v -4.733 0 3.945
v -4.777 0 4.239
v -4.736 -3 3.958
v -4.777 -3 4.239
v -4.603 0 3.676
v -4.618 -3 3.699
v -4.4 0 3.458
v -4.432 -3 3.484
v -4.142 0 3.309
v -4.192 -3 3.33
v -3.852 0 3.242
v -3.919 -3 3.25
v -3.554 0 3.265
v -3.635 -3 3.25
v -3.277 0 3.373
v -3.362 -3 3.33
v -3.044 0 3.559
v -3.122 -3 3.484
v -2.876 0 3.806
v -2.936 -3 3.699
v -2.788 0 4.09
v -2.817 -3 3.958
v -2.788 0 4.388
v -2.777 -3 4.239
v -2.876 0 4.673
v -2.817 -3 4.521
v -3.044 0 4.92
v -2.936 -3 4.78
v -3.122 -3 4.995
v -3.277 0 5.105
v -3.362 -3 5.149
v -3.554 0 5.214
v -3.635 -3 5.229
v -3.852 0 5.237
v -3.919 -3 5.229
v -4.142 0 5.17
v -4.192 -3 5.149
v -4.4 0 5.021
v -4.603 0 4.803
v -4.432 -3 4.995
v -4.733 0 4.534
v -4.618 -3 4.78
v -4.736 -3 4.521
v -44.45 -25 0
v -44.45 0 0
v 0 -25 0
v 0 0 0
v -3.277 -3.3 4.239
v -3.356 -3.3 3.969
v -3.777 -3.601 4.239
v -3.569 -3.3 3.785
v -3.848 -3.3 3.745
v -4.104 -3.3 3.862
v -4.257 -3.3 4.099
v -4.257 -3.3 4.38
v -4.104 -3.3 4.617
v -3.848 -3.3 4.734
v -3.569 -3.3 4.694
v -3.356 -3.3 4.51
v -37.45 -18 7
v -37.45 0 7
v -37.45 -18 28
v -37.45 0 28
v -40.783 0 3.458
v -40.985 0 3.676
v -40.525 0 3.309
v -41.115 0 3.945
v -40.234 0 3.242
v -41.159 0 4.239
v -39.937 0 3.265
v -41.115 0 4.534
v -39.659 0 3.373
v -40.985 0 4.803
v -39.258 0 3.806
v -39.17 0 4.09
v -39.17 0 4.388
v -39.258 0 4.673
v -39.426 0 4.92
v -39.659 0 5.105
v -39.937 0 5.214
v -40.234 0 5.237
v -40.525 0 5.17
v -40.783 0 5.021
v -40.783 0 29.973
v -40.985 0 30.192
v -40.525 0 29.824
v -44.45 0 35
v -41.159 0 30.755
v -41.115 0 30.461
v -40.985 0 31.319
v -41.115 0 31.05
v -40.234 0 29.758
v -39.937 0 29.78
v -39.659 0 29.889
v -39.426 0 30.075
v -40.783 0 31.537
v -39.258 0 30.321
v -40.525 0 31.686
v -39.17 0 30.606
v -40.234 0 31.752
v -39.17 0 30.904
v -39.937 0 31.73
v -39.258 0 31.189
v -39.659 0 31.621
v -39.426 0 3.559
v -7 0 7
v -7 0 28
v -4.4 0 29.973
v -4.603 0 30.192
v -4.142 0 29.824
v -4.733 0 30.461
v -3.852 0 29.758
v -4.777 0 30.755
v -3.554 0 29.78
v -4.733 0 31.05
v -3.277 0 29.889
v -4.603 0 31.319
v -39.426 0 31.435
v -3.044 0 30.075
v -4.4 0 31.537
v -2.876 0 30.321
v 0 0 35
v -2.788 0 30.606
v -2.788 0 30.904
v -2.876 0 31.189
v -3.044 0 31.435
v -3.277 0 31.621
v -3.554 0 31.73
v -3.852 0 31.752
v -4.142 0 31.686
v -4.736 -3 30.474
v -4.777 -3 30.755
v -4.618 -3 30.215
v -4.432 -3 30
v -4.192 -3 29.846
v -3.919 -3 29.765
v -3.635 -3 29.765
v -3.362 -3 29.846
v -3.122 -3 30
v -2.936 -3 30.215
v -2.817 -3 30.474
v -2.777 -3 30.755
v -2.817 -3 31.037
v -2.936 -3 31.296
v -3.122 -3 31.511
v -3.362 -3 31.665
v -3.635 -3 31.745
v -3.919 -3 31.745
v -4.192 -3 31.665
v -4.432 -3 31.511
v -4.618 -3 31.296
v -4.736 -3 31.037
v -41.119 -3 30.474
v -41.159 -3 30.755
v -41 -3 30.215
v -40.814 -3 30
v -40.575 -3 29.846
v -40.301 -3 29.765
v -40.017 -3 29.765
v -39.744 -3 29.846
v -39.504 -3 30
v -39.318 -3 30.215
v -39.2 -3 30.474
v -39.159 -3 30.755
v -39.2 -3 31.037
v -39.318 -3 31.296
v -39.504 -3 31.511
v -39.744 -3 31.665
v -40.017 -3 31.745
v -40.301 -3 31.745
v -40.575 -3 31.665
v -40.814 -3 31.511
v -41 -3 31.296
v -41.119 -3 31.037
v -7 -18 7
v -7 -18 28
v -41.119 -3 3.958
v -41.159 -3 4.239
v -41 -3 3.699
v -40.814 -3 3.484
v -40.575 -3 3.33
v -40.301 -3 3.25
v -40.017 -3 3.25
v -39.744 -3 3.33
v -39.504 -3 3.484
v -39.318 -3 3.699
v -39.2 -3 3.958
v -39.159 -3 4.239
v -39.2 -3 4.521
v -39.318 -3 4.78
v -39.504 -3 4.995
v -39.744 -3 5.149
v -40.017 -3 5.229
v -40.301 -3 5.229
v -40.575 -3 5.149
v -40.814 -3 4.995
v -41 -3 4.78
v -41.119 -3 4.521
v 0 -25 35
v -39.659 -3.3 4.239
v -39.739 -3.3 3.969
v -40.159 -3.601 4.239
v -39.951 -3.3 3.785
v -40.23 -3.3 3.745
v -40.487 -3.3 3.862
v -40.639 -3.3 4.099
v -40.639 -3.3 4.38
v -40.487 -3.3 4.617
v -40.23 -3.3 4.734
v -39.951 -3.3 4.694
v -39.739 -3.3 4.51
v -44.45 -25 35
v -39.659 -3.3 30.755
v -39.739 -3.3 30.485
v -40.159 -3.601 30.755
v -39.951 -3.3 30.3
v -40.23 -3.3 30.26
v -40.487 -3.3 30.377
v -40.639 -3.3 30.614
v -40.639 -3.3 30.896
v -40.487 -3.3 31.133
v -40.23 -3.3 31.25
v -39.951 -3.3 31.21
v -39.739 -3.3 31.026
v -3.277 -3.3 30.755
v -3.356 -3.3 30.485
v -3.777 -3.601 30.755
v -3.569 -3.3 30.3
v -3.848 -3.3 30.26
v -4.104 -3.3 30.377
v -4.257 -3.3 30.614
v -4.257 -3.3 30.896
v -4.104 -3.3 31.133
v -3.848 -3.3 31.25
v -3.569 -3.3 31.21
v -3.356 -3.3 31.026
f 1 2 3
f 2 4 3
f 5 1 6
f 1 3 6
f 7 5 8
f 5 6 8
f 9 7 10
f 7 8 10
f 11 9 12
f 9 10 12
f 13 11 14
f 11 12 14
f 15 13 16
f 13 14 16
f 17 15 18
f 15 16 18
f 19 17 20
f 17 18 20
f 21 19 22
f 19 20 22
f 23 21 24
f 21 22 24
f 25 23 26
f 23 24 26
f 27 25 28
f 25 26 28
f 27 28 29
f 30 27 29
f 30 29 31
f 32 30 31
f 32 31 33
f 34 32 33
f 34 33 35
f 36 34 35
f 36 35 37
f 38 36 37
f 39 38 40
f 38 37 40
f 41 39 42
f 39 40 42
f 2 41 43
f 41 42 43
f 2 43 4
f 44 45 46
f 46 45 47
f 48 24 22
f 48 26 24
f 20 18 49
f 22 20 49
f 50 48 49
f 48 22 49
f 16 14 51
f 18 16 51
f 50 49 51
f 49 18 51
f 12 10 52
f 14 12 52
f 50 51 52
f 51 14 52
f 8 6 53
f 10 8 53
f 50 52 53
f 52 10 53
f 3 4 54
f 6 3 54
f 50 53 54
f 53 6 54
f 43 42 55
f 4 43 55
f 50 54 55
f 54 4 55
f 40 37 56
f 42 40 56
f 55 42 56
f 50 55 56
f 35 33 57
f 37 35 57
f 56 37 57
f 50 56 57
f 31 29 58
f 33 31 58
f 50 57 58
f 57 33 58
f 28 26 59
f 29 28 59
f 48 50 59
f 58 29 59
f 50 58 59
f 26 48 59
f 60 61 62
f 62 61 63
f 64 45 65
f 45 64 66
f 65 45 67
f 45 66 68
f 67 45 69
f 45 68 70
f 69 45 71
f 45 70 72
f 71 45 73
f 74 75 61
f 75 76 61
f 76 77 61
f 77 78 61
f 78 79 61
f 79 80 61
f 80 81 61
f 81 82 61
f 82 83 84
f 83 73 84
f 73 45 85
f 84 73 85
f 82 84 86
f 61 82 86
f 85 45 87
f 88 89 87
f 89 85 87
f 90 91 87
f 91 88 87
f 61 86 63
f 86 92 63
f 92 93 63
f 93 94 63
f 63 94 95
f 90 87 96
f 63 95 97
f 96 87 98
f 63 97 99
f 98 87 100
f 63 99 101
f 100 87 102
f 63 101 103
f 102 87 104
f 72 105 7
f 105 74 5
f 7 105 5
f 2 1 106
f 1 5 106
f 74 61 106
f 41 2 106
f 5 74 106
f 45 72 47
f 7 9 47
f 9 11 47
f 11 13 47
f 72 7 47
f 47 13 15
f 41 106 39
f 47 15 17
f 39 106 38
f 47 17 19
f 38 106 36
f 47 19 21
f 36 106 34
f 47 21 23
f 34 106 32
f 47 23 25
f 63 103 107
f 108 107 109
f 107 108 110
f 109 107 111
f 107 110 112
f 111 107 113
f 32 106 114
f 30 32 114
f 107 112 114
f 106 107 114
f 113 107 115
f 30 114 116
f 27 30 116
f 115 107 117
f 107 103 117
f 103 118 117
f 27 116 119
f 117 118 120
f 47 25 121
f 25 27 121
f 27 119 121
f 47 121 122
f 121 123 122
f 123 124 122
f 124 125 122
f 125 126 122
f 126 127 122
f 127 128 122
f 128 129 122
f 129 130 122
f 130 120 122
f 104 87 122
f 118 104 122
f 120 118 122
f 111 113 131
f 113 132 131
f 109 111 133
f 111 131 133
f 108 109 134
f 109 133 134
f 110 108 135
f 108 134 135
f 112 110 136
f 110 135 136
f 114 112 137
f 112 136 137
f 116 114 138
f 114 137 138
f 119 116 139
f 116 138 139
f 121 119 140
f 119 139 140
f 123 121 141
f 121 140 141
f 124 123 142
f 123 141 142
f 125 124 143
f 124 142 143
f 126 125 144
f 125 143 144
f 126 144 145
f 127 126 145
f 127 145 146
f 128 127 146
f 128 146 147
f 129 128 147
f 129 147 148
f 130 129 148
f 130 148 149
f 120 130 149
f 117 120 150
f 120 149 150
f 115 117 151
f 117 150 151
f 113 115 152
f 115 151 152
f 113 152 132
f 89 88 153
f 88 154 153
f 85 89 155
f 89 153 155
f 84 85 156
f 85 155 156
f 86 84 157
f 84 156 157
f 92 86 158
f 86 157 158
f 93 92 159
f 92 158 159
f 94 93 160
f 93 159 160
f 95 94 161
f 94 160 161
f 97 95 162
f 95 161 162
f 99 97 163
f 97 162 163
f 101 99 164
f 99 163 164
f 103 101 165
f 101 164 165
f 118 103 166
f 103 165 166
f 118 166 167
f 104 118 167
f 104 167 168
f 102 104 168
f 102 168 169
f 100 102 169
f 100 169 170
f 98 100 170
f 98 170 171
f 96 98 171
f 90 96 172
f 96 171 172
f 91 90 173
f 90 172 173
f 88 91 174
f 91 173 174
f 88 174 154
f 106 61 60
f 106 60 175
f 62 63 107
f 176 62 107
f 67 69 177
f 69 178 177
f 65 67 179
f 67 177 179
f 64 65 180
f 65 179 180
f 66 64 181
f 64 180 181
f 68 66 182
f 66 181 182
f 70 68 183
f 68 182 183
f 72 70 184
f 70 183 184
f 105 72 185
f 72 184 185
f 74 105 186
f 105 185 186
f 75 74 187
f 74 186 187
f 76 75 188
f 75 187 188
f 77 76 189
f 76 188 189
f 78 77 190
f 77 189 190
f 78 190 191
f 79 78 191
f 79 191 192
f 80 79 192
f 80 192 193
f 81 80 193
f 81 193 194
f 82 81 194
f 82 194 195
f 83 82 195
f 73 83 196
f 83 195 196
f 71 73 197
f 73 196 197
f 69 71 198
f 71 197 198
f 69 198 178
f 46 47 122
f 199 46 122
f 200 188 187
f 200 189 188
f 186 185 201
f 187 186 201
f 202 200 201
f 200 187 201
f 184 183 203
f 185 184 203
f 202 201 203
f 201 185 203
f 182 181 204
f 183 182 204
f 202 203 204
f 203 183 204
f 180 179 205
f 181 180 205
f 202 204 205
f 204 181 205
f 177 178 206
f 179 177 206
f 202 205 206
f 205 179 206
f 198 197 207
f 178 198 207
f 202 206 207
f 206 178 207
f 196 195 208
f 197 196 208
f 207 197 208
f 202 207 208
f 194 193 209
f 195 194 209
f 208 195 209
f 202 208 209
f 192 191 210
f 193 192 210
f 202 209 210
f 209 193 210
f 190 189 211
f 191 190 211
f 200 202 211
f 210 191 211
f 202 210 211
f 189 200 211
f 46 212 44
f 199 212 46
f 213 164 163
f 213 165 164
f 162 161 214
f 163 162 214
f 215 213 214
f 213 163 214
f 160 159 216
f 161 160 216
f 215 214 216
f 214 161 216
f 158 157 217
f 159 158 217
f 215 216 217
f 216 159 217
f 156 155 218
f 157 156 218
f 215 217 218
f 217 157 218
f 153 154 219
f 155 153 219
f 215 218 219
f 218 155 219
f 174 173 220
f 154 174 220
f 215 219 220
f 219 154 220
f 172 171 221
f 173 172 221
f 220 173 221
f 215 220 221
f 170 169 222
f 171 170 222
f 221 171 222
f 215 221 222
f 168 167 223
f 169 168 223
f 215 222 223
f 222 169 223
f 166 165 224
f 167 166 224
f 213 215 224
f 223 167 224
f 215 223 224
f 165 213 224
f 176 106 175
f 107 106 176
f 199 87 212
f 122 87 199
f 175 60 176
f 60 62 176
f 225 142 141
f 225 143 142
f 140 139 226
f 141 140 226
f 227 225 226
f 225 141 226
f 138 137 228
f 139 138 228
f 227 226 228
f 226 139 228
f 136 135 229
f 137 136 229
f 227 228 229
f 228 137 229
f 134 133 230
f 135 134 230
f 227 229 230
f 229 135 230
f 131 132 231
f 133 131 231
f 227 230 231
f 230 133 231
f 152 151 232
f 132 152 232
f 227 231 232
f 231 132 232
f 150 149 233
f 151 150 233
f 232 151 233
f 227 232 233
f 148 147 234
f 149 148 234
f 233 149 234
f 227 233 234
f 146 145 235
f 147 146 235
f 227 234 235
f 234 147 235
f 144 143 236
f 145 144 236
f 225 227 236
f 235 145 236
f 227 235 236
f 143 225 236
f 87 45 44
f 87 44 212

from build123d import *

# Parameters (mm, degrees)
F0_W     = 44.45
F0_H     = 35
F1_DEPTH = 25
F2_T     = -7
F3_D     = 2
F3_DEPTH = 3
F3_TIP   = 0.600860619


with BuildPart() as f1:
    # F0 (on Front) → F1 (new body)
    with BuildSketch(Plane.XZ):
        with Locations((-22.225, 17.5)):
            Rectangle(F0_W, F0_H)
    extrude(amount=F1_DEPTH)

    # F2
    f2_openings = [f1.faces().sort_by_distance(p)[0] for p in [
        (-22.225, 0, 17.5),
    ]]
    offset(amount=F2_T, openings=f2_openings)

    # F3
    with Locations(Plane(origin=(0, 0, 0), x_dir=(1, 0, 0), z_dir=(0, 1, 0))):
        with Locations((-3.7769665942, -30.7552888989), (-40.1591621339, -30.7552888989), (-40.1591621339, -4.2394511402), (-3.7769665942, -4.2394511402)):
            Hole(F3_D / 2, depth=F3_DEPTH)
            with Locations((0, 0, -(F3_DEPTH + F3_TIP / 2))):  # 118° drill point
                Cone(0, F3_D / 2, F3_TIP, mode=Mode.SUBTRACT)


solid = f1.part
